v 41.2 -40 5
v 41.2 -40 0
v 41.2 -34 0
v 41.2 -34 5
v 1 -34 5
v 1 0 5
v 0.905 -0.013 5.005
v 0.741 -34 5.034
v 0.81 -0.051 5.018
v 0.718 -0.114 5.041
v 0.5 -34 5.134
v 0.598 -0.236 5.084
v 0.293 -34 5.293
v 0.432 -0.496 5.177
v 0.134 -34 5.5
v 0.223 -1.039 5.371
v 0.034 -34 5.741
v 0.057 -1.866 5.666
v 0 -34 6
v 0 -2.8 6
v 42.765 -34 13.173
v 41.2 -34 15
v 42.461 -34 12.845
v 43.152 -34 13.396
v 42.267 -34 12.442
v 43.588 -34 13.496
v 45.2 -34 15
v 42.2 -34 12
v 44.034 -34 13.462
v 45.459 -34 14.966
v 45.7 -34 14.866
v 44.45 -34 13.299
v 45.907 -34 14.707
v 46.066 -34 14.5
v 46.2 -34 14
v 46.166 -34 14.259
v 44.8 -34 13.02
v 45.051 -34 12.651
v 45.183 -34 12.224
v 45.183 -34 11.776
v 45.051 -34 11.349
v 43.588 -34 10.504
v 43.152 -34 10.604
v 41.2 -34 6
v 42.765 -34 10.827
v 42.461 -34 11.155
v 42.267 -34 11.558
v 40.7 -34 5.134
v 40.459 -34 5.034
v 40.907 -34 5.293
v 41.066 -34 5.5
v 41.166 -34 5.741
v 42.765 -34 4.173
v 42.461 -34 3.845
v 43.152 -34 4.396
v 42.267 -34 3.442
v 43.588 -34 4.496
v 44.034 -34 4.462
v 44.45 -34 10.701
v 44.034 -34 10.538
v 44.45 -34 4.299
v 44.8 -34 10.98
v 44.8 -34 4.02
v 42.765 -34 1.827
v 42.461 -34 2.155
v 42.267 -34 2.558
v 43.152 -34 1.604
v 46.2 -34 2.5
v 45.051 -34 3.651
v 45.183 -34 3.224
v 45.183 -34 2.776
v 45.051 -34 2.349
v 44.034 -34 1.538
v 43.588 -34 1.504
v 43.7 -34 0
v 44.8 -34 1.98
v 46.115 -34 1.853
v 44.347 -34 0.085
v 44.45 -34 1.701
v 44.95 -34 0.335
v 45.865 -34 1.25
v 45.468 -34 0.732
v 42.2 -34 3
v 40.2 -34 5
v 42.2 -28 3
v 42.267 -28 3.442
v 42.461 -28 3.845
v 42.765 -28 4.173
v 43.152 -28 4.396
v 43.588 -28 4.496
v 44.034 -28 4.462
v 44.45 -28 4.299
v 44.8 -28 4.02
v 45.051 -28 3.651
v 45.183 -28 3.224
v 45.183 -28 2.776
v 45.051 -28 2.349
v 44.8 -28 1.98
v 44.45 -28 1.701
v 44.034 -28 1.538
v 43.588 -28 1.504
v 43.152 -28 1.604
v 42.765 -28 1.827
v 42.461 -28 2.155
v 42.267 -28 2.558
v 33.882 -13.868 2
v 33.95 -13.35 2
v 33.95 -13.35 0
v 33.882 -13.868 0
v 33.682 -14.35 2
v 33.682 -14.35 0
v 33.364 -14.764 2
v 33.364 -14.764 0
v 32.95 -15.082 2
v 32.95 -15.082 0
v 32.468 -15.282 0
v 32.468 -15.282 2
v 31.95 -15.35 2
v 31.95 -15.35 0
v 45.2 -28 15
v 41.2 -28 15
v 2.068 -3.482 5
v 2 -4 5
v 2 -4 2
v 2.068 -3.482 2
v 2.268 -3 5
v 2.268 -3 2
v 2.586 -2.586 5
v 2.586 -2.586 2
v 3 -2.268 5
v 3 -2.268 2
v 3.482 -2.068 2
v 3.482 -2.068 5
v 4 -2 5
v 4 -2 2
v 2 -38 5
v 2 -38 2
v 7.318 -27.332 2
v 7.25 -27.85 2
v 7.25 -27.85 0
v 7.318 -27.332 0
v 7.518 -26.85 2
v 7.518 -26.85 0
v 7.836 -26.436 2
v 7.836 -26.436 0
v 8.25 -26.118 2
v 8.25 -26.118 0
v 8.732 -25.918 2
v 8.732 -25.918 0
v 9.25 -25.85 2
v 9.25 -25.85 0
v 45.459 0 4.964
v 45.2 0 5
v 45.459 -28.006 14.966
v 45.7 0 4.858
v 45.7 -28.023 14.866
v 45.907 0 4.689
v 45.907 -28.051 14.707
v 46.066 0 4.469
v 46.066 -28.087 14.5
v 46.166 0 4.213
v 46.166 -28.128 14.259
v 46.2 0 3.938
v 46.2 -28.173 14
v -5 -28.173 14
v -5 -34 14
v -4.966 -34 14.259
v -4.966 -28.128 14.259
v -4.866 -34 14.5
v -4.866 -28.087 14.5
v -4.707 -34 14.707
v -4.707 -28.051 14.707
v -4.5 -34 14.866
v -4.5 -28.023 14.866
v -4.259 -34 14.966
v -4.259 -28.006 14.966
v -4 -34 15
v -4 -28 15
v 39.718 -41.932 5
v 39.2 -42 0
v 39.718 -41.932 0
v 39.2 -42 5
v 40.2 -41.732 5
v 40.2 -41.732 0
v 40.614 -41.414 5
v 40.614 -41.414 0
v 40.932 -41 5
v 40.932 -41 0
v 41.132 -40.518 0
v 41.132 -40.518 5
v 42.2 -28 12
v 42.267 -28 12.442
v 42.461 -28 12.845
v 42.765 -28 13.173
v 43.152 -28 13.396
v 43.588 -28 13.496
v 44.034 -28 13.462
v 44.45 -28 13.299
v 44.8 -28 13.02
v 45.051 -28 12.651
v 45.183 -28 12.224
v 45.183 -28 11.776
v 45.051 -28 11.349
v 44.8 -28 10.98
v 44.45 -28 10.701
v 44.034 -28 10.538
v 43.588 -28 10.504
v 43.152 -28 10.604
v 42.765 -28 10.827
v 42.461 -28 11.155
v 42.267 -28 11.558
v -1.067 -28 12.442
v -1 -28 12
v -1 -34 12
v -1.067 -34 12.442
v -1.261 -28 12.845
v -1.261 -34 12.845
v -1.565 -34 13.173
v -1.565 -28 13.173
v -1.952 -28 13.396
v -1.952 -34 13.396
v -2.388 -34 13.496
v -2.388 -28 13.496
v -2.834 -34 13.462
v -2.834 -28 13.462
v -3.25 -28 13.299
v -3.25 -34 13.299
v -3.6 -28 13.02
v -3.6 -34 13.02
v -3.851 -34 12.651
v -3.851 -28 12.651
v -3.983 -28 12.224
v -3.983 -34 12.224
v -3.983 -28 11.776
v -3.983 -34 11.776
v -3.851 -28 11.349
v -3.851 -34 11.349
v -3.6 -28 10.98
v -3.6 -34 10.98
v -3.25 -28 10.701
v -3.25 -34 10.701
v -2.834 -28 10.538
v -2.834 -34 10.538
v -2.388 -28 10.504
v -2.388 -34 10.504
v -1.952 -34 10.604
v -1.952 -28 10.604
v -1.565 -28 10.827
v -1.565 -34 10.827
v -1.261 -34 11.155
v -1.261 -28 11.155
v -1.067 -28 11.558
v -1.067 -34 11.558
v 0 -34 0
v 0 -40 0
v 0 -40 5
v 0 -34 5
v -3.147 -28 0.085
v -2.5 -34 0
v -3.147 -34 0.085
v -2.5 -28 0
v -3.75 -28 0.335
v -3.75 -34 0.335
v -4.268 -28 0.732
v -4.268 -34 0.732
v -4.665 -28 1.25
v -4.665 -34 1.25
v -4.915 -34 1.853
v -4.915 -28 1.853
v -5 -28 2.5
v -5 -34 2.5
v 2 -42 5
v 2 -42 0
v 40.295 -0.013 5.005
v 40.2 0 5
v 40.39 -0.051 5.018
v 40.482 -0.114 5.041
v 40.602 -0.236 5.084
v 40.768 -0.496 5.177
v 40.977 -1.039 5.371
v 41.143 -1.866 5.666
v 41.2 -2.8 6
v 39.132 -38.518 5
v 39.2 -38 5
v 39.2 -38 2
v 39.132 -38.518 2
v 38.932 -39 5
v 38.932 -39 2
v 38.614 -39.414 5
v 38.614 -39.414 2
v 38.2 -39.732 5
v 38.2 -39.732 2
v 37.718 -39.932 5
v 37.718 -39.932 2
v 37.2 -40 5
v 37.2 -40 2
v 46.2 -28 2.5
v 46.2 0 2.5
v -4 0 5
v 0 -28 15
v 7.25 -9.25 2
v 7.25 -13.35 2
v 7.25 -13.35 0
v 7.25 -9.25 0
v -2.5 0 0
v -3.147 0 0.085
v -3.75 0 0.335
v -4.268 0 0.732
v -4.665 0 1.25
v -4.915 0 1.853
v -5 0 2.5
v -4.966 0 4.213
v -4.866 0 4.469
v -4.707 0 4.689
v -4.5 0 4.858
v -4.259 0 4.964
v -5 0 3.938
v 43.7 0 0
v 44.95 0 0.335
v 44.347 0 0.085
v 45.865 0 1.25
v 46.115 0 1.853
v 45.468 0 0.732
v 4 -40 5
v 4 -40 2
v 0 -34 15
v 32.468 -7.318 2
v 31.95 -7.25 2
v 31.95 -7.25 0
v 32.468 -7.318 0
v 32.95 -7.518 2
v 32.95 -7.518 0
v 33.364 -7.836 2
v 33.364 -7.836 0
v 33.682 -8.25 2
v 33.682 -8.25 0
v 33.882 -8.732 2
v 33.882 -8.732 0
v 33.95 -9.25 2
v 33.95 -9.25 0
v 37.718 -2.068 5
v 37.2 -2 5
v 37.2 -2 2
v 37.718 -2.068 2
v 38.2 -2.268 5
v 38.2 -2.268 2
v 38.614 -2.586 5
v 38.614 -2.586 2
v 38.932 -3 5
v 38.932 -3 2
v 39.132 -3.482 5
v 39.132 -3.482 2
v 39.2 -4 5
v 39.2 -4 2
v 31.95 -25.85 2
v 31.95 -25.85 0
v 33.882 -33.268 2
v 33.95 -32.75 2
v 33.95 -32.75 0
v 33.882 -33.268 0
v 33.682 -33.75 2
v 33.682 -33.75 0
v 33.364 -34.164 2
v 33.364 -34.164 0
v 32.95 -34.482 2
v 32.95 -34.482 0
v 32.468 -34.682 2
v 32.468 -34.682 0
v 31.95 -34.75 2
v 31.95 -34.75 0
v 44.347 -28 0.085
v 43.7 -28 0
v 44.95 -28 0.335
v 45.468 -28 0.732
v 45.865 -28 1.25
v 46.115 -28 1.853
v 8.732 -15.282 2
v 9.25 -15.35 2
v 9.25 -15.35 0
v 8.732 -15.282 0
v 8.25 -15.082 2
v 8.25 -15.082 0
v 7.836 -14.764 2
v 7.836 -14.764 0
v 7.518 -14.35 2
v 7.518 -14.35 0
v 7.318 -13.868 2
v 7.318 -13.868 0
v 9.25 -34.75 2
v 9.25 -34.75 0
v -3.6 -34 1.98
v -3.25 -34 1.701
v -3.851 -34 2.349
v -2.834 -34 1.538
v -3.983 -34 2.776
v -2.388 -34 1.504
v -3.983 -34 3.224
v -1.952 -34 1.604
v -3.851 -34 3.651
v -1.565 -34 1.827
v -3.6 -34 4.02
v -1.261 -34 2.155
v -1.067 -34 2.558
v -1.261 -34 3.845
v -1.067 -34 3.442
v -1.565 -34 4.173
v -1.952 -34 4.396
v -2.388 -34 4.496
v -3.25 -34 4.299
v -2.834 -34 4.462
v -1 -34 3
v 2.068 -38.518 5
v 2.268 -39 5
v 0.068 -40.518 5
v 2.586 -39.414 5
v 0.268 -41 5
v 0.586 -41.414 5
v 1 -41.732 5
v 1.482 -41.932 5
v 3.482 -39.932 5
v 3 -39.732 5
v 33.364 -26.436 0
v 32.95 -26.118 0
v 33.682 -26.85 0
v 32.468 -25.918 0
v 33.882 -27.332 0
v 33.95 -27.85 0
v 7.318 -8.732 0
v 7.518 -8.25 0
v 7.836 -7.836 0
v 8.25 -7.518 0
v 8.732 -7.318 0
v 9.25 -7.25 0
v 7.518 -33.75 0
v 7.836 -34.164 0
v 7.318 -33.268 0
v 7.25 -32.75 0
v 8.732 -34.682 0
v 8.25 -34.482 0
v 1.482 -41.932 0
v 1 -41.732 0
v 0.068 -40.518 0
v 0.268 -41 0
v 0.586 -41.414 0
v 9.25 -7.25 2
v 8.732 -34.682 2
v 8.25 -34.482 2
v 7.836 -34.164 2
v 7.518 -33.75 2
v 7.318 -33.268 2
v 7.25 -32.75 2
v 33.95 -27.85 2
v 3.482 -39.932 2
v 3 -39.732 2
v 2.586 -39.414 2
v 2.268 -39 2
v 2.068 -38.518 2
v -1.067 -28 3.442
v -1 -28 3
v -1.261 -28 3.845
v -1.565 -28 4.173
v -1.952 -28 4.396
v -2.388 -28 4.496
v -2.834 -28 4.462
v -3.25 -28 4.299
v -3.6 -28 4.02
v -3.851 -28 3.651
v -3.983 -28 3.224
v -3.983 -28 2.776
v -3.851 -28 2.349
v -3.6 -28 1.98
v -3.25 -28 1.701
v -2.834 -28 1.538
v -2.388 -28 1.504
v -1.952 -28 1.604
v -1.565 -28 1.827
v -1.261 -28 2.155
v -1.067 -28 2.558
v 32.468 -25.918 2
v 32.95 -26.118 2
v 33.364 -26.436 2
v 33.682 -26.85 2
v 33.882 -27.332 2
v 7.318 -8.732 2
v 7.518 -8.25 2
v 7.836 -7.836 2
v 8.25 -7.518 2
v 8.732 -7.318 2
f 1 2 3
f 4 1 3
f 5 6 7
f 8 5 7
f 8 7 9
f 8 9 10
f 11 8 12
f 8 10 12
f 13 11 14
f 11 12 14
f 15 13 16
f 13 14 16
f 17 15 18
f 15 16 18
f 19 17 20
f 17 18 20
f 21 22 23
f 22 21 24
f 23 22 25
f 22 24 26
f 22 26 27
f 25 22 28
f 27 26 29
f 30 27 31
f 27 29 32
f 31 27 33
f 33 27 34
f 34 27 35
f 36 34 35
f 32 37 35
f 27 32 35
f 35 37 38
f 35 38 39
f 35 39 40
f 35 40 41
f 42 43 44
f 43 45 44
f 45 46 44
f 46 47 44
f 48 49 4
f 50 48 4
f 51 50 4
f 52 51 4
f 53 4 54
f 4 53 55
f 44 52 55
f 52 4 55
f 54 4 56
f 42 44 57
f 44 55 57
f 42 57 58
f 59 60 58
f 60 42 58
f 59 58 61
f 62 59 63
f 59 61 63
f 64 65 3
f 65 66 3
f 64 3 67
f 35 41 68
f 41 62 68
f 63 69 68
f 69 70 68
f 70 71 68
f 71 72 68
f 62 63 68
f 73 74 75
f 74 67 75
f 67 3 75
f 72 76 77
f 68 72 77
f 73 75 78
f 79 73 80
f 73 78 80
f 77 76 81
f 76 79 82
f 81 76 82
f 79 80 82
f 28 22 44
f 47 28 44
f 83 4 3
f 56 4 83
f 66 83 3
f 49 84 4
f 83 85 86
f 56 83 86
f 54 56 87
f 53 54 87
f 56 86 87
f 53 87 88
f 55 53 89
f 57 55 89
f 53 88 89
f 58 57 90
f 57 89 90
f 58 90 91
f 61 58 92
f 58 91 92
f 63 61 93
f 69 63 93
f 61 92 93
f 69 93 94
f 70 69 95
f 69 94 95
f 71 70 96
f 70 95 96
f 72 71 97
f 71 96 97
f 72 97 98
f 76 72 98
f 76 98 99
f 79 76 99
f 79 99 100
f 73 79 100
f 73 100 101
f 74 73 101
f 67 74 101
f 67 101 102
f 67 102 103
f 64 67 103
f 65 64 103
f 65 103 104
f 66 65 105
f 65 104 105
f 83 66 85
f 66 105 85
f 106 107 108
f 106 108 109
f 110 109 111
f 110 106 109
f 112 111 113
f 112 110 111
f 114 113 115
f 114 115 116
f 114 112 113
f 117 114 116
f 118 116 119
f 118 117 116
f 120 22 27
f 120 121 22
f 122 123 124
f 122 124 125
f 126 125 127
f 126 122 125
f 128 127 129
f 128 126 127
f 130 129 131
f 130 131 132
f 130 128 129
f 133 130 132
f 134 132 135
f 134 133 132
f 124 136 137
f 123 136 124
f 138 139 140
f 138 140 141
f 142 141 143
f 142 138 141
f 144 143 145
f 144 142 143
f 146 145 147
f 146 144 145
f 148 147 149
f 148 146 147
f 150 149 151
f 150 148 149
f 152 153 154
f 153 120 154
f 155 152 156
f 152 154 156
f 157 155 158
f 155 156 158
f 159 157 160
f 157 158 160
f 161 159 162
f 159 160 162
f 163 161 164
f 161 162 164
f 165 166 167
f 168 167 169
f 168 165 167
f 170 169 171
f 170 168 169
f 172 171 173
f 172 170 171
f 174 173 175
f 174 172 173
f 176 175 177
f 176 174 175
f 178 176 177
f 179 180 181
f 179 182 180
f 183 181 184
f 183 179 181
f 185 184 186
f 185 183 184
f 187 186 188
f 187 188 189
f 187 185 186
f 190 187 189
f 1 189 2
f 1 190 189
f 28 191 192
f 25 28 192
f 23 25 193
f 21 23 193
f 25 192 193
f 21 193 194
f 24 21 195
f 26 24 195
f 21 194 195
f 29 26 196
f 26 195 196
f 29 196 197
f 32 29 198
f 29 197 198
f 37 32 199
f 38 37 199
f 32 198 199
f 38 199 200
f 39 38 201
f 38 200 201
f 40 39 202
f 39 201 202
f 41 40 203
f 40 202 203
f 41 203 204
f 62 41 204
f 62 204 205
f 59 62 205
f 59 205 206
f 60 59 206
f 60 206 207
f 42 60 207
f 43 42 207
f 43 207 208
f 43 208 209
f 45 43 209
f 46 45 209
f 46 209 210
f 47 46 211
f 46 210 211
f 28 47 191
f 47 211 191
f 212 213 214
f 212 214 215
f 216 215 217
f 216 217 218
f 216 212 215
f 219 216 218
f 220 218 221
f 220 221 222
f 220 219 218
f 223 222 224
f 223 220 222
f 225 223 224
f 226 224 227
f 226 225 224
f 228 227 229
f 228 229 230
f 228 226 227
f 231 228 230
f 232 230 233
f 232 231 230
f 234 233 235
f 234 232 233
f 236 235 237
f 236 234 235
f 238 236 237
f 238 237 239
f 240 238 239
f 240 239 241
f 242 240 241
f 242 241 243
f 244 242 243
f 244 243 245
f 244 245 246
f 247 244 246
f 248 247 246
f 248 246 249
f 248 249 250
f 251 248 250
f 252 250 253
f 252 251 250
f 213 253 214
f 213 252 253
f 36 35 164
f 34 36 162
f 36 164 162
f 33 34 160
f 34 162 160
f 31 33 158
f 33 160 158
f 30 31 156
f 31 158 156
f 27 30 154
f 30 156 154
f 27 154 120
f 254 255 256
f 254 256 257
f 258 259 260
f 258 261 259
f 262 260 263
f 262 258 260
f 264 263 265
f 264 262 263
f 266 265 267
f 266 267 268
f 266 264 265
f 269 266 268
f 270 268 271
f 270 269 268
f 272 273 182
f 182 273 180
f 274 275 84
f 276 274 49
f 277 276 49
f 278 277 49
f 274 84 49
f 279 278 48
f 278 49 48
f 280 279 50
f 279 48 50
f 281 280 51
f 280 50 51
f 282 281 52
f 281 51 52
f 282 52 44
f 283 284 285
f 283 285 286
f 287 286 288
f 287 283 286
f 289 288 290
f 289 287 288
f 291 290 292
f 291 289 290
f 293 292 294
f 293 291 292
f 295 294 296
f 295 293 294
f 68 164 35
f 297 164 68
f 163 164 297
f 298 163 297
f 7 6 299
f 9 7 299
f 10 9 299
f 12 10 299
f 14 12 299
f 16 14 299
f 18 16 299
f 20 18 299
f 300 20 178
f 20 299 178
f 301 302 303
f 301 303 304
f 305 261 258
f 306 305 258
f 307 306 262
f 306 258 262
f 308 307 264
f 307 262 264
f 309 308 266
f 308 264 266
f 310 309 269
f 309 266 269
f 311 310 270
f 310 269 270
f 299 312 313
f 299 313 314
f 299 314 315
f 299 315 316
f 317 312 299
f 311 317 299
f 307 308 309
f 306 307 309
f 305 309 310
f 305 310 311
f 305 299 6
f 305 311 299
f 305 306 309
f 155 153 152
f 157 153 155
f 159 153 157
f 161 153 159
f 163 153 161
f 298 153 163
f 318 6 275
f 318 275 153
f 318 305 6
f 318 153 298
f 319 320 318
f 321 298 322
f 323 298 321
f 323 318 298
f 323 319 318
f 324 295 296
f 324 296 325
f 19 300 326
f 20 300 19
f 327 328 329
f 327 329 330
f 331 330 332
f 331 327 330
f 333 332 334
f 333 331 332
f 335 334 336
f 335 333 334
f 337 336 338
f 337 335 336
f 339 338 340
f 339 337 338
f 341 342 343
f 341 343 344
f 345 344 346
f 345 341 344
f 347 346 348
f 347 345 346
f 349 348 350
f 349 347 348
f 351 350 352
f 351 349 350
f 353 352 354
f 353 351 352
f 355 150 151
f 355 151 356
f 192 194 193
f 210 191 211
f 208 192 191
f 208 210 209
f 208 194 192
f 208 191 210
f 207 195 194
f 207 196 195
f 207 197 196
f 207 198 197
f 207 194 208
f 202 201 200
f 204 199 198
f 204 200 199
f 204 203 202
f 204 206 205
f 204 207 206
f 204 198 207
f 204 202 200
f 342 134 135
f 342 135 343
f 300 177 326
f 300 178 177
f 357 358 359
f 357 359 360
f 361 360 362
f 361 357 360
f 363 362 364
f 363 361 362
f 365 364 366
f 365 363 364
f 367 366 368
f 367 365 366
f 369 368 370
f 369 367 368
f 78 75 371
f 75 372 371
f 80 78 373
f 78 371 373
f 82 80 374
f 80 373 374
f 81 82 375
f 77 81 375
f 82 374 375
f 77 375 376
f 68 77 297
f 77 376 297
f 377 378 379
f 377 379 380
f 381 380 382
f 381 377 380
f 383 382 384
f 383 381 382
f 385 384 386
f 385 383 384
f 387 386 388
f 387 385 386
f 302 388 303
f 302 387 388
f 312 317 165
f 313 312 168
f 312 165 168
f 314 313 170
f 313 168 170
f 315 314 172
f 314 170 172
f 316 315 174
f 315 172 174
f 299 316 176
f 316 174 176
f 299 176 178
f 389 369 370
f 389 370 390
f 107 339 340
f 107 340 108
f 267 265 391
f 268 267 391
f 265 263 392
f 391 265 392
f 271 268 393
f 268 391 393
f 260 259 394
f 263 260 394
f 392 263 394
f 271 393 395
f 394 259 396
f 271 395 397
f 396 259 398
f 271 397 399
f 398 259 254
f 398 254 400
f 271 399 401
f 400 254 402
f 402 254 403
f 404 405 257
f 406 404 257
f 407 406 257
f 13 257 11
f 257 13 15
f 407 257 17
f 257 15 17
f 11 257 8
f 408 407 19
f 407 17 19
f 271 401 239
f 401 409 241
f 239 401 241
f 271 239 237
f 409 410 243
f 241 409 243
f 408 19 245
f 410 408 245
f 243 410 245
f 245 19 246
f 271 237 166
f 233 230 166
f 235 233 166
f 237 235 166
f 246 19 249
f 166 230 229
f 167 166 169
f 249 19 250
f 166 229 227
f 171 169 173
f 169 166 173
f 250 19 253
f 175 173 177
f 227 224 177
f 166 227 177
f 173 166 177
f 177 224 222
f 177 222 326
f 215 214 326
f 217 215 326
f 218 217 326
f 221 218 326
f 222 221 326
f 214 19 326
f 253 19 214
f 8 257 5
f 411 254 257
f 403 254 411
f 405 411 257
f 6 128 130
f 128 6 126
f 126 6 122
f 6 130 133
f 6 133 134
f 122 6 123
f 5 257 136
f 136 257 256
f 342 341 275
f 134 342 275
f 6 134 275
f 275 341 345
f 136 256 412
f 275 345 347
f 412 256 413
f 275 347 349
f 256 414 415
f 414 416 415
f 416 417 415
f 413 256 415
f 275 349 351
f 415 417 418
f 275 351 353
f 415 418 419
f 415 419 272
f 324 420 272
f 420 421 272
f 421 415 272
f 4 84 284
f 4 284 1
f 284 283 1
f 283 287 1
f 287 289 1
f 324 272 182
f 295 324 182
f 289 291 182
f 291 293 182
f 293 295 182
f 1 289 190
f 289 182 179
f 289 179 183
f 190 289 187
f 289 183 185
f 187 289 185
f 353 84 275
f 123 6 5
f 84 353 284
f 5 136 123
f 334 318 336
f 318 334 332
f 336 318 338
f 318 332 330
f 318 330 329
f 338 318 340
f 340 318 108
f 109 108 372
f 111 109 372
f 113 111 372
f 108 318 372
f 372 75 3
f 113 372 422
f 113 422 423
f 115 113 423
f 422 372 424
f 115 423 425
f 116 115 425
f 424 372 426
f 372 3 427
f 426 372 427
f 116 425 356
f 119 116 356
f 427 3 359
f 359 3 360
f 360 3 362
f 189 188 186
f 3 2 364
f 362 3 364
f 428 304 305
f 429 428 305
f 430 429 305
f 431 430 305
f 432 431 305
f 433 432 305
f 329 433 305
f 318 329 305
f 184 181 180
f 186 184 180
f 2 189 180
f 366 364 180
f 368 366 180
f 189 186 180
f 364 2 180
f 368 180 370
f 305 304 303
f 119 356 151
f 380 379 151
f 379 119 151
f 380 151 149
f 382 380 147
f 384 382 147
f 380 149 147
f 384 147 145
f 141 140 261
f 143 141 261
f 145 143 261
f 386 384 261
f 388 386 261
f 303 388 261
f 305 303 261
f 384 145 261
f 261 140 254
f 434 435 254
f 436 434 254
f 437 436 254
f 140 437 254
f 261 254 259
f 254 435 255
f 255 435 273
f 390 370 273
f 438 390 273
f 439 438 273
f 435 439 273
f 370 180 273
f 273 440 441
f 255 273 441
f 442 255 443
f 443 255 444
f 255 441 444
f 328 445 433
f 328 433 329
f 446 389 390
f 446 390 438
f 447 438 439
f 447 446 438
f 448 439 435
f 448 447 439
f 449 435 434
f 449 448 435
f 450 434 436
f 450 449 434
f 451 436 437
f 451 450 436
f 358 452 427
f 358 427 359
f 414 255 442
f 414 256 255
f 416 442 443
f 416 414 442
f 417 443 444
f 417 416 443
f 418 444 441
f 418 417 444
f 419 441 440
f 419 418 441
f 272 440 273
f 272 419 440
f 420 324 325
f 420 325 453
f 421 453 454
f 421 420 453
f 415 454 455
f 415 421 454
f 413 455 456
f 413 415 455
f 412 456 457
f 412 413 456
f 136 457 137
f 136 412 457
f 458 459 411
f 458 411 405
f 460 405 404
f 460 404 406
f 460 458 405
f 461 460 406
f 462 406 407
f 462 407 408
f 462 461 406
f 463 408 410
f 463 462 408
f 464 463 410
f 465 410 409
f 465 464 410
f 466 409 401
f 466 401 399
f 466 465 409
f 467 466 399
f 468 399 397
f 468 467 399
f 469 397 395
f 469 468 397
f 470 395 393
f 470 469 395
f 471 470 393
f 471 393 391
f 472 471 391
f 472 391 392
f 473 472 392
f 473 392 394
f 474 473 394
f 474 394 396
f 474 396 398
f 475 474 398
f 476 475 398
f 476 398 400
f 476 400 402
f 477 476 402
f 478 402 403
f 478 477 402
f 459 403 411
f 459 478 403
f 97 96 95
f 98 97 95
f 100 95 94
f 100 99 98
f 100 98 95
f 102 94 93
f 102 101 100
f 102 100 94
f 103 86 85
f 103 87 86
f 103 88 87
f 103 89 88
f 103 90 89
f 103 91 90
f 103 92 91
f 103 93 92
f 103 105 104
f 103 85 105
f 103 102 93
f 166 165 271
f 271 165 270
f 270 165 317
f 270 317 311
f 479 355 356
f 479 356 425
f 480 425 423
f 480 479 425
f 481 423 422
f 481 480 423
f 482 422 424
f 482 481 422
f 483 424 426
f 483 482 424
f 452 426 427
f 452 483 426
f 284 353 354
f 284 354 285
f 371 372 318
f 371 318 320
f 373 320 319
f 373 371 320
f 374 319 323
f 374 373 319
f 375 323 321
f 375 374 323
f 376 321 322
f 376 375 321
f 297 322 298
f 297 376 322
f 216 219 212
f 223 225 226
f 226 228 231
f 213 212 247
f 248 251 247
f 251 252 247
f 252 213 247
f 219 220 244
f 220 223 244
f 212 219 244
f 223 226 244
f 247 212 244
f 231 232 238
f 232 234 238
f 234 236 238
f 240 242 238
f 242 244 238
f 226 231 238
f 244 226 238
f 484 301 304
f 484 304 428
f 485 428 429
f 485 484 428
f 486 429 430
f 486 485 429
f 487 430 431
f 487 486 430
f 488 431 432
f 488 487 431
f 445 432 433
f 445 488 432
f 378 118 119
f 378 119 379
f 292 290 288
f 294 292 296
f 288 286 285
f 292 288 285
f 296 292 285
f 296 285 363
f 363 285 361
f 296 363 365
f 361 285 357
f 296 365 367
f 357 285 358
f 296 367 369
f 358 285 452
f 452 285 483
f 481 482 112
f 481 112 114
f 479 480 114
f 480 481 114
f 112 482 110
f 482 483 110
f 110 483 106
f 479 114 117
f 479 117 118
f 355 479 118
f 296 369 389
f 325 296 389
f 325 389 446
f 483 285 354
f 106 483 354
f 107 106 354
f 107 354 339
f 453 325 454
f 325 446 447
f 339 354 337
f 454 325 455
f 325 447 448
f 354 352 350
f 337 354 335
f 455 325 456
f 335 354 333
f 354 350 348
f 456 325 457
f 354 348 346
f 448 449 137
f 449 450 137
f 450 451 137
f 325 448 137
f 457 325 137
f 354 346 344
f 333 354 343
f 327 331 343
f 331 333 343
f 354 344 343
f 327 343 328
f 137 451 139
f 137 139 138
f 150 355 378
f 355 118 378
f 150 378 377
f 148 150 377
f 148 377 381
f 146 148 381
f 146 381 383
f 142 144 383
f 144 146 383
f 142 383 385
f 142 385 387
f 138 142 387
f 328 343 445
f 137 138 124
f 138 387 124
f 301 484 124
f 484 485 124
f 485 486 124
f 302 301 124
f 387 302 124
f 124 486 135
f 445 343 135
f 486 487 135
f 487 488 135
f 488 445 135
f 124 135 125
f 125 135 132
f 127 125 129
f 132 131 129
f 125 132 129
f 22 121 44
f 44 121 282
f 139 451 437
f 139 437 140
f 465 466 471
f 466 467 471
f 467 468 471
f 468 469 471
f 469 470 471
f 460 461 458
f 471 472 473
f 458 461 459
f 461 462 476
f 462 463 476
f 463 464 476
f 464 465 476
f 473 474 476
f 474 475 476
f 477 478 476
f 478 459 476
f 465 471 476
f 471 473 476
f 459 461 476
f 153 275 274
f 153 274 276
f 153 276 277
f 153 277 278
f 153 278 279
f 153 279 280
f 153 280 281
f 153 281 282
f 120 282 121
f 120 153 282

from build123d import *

# Parameters (mm, degrees)
SKETCH1_W           = 41.2
SKETCH1_H           = 42
BOSS_EXTRUDE1_DEPTH = 5
CUT_EXTRUDE1_DEPTH  = 3
CUT_EXTRUDE2_DEPTH  = 2
SKETCH6_W           = 5
SKETCH6_H           = 6
BOSS_EXTRUDE2_DEPTH = 5
SKETCH7_W           = 5
SKETCH7_H           = 6
BOSS_EXTRUDE3_DEPTH = 5
SKETCH13_W          = 5
SKETCH13_H          = 6
BOSS_EXTRUDE6_DEPTH = 10
SKETCH10_R          = 1.5
CUT_EXTRUDE3_DEPTH  = 6
FILLET4_R           = 2.5
BOSS_EXTRUDE7_DEPTH = 28
BOSS_EXTRUDE8_DEPTH = 5
FILLET10_R          = 1
FILLET12_R          = 2
FILLET13_R          = 1
FILLET14_R          = 1


with BuildPart() as part:
    # Sketch1 → Boss-Extrude1 (new body)
    with BuildSketch(Plane.XY):
        with Locations((20.6, -21)):
            Rectangle(SKETCH1_W, SKETCH1_H)
    extrude(amount=BOSS_EXTRUDE1_DEPTH)

    # Sketch2 → Cut-Extrude1 (cut)
    with BuildSketch(Plane.XY.offset(5)):
        with BuildLine():
            Line((4, -2), (37.2, -2))
            ThreePointArc((37.2, -2), (38.614213562, -2.585786438), (39.2, -4))
            Line((39.2, -4), (39.2, -38))
            ThreePointArc((39.2, -38), (38.614213562, -39.414213562), (37.2, -40))
            Line((37.2, -40), (4, -40))
            ThreePointArc((4, -40), (2.585786438, -39.414213562), (2, -38))
            Line((2, -38), (2, -4))
            ThreePointArc((2, -4), (2.585786438, -2.585786438), (4, -2))
        make_face()
    extrude(amount=-CUT_EXTRUDE1_DEPTH, mode=Mode.SUBTRACT)

    # Sketch3 → Cut-Extrude2 (cut)
    with BuildSketch(Plane.XY.offset(2)):
        with BuildLine():
            Line((9.25, -7.25), (31.95, -7.25))
            ThreePointArc((31.95, -7.25), (33.364213562, -7.835786438), (33.95, -9.25))
            Line((33.95, -9.25), (33.95, -13.35))
            ThreePointArc((33.95, -13.35), (33.364213562, -14.764213562), (31.95, -15.35))
            Line((31.95, -15.35), (9.25, -15.35))
            ThreePointArc((9.25, -15.35), (7.835786438, -14.764213562), (7.25, -13.35))
            Line((7.25, -13.35), (7.25, -9.25))
            ThreePointArc((7.25, -9.25), (7.835786438, -7.835786438), (9.25, -7.25))
        make_face()
        with BuildLine():
            Line((9.25, -25.85), (31.95, -25.85))
            ThreePointArc((31.95, -25.85), (33.364213562, -26.435786438), (33.95, -27.85))
            Line((33.95, -27.85), (33.95, -32.75))
            ThreePointArc((33.95, -32.75), (33.364213562, -34.164213562), (31.95, -34.75))
            Line((31.95, -34.75), (9.25, -34.75))
            ThreePointArc((9.25, -34.75), (7.835786438, -34.164213562), (7.25, -32.75))
            Line((7.25, -32.75), (7.25, -27.85))
            ThreePointArc((7.25, -27.85), (7.835786438, -26.435786438), (9.25, -25.85))
        make_face()
    extrude(amount=-CUT_EXTRUDE2_DEPTH, mode=Mode.SUBTRACT)

    # Sketch6 → Boss-Extrude2 (add)
    with BuildSketch(Plane(origin=(41.2, 0, 0), x_dir=(0, 0, -1), z_dir=(1, 0, 0))):
        with Locations((-2.5, -31)):
            Rectangle(SKETCH6_W, SKETCH6_H)
    extrude(amount=BOSS_EXTRUDE2_DEPTH)

    # Sketch7 → Boss-Extrude3 (add)
    with BuildSketch(Plane.ZY):
        with Locations((2.5, -31)):
            Rectangle(SKETCH7_W, SKETCH7_H)
    extrude(amount=BOSS_EXTRUDE3_DEPTH)

    # Sketch13 → Boss-Extrude6 (add)
    with BuildSketch(Plane.XY.offset(5)):
        with Locations((43.7, -31)):
            Rectangle(SKETCH13_W, SKETCH13_H)
        with Locations((-2.5, -31)):
            Rectangle(SKETCH13_W, SKETCH13_H)
    extrude(amount=BOSS_EXTRUDE6_DEPTH)

    # Sketch10 → Cut-Extrude3 (cut)
    with BuildSketch(Plane(origin=(0, -28, 0), x_dir=(1, 0, 0), z_dir=(0, 1, 0))):
        with Locations(Location((43.7, -3, 0), (0, 0, 180))):
            Circle(SKETCH10_R)
        with Locations(Location((43.7, -12, 0), (0, 0, 180))):
            Circle(SKETCH10_R)
    cut_extrude3 = extrude(amount=-CUT_EXTRUDE3_DEPTH, mode=Mode.SUBTRACT)

    # Mirror1: Cut-Extrude3 across plane
    add(cut_extrude3.mirror(Plane(origin=(20.6, 0, 0), x_dir=(0, 0, 1), z_dir=(1, 0, 0))), mode=Mode.SUBTRACT)

    # Fillet4
    fillet4_edges = [part.edges().sort_by_distance(p)[0] for p in [
        (-5, -31, 0),
        (46.2, -31, 0),
    ]]
    fillet(fillet4_edges, radius=FILLET4_R)

    # Sketch16 → Boss-Extrude7 (add)
    with BuildSketch(Plane(origin=(0, -28, 0), x_dir=(1, 0, 0), z_dir=(0, 1, 0))):
        with BuildLine():
            Line((41.2, 0), (43.7, 0))
            ThreePointArc((43.7, 0), (45.467766953, -0.732233047), (46.2, -2.5))
            Line((46.2, -2.5), (46.2, -5))
            Line((46.2, -5), (41.2, -5))
            Line((41.2, -5), (41.2, 0))
        make_face()
    boss_extrude7 = extrude(amount=BOSS_EXTRUDE7_DEPTH)

    # Sketch17 → Boss-Extrude8 (add)
    with BuildSketch(Plane(origin=(46.2, 0, 0), x_dir=(0, 0, -1), z_dir=(1, 0, 0))):
        Polygon((-5, 0), (-15, -28), (-5, -28), align=None)
    boss_extrude8 = extrude(amount=-BOSS_EXTRUDE8_DEPTH)

    # Fillet10
    fillet10_edges = [part.edges().sort_by_distance(p)[0] for p in [
        (46.2, -31, 15),
        (46.2, -14, 10),
    ]]
    fillet(fillet10_edges, radius=FILLET10_R)

    # Mirror3: Boss-Extrude7, Boss-Extrude8 across plane
    add(boss_extrude7.mirror(Plane(origin=(20.6, 0, 0), x_dir=(0, 0, 1), z_dir=(1, 0, 0))))
    add(boss_extrude8.mirror(Plane(origin=(20.6, 0, 0), x_dir=(0, 0, 1), z_dir=(1, 0, 0))))

    # Fillet12
    fillet12_edges = [part.edges().sort_by_distance(p)[0] for p in [
        (41.2, -42, 2.5),
        (0, -42, 2.5),
    ]]
    fillet(fillet12_edges, radius=FILLET12_R)

    # Fillet13
    fillet13_edges = [part.edges().sort_by_distance(p)[0] for p in [
        (-5, -31, 15),
        (-5, -14, 10),
    ]]
    fillet(fillet13_edges, radius=FILLET13_R)

    # Fillet14
    fillet14_edges = [part.edges().sort_by_distance(p)[0] for p in [
        (41.2, -17, 5),
        (0, -17, 5),
    ]]
    fillet(fillet14_edges, radius=FILLET14_R)


solid = part.part
